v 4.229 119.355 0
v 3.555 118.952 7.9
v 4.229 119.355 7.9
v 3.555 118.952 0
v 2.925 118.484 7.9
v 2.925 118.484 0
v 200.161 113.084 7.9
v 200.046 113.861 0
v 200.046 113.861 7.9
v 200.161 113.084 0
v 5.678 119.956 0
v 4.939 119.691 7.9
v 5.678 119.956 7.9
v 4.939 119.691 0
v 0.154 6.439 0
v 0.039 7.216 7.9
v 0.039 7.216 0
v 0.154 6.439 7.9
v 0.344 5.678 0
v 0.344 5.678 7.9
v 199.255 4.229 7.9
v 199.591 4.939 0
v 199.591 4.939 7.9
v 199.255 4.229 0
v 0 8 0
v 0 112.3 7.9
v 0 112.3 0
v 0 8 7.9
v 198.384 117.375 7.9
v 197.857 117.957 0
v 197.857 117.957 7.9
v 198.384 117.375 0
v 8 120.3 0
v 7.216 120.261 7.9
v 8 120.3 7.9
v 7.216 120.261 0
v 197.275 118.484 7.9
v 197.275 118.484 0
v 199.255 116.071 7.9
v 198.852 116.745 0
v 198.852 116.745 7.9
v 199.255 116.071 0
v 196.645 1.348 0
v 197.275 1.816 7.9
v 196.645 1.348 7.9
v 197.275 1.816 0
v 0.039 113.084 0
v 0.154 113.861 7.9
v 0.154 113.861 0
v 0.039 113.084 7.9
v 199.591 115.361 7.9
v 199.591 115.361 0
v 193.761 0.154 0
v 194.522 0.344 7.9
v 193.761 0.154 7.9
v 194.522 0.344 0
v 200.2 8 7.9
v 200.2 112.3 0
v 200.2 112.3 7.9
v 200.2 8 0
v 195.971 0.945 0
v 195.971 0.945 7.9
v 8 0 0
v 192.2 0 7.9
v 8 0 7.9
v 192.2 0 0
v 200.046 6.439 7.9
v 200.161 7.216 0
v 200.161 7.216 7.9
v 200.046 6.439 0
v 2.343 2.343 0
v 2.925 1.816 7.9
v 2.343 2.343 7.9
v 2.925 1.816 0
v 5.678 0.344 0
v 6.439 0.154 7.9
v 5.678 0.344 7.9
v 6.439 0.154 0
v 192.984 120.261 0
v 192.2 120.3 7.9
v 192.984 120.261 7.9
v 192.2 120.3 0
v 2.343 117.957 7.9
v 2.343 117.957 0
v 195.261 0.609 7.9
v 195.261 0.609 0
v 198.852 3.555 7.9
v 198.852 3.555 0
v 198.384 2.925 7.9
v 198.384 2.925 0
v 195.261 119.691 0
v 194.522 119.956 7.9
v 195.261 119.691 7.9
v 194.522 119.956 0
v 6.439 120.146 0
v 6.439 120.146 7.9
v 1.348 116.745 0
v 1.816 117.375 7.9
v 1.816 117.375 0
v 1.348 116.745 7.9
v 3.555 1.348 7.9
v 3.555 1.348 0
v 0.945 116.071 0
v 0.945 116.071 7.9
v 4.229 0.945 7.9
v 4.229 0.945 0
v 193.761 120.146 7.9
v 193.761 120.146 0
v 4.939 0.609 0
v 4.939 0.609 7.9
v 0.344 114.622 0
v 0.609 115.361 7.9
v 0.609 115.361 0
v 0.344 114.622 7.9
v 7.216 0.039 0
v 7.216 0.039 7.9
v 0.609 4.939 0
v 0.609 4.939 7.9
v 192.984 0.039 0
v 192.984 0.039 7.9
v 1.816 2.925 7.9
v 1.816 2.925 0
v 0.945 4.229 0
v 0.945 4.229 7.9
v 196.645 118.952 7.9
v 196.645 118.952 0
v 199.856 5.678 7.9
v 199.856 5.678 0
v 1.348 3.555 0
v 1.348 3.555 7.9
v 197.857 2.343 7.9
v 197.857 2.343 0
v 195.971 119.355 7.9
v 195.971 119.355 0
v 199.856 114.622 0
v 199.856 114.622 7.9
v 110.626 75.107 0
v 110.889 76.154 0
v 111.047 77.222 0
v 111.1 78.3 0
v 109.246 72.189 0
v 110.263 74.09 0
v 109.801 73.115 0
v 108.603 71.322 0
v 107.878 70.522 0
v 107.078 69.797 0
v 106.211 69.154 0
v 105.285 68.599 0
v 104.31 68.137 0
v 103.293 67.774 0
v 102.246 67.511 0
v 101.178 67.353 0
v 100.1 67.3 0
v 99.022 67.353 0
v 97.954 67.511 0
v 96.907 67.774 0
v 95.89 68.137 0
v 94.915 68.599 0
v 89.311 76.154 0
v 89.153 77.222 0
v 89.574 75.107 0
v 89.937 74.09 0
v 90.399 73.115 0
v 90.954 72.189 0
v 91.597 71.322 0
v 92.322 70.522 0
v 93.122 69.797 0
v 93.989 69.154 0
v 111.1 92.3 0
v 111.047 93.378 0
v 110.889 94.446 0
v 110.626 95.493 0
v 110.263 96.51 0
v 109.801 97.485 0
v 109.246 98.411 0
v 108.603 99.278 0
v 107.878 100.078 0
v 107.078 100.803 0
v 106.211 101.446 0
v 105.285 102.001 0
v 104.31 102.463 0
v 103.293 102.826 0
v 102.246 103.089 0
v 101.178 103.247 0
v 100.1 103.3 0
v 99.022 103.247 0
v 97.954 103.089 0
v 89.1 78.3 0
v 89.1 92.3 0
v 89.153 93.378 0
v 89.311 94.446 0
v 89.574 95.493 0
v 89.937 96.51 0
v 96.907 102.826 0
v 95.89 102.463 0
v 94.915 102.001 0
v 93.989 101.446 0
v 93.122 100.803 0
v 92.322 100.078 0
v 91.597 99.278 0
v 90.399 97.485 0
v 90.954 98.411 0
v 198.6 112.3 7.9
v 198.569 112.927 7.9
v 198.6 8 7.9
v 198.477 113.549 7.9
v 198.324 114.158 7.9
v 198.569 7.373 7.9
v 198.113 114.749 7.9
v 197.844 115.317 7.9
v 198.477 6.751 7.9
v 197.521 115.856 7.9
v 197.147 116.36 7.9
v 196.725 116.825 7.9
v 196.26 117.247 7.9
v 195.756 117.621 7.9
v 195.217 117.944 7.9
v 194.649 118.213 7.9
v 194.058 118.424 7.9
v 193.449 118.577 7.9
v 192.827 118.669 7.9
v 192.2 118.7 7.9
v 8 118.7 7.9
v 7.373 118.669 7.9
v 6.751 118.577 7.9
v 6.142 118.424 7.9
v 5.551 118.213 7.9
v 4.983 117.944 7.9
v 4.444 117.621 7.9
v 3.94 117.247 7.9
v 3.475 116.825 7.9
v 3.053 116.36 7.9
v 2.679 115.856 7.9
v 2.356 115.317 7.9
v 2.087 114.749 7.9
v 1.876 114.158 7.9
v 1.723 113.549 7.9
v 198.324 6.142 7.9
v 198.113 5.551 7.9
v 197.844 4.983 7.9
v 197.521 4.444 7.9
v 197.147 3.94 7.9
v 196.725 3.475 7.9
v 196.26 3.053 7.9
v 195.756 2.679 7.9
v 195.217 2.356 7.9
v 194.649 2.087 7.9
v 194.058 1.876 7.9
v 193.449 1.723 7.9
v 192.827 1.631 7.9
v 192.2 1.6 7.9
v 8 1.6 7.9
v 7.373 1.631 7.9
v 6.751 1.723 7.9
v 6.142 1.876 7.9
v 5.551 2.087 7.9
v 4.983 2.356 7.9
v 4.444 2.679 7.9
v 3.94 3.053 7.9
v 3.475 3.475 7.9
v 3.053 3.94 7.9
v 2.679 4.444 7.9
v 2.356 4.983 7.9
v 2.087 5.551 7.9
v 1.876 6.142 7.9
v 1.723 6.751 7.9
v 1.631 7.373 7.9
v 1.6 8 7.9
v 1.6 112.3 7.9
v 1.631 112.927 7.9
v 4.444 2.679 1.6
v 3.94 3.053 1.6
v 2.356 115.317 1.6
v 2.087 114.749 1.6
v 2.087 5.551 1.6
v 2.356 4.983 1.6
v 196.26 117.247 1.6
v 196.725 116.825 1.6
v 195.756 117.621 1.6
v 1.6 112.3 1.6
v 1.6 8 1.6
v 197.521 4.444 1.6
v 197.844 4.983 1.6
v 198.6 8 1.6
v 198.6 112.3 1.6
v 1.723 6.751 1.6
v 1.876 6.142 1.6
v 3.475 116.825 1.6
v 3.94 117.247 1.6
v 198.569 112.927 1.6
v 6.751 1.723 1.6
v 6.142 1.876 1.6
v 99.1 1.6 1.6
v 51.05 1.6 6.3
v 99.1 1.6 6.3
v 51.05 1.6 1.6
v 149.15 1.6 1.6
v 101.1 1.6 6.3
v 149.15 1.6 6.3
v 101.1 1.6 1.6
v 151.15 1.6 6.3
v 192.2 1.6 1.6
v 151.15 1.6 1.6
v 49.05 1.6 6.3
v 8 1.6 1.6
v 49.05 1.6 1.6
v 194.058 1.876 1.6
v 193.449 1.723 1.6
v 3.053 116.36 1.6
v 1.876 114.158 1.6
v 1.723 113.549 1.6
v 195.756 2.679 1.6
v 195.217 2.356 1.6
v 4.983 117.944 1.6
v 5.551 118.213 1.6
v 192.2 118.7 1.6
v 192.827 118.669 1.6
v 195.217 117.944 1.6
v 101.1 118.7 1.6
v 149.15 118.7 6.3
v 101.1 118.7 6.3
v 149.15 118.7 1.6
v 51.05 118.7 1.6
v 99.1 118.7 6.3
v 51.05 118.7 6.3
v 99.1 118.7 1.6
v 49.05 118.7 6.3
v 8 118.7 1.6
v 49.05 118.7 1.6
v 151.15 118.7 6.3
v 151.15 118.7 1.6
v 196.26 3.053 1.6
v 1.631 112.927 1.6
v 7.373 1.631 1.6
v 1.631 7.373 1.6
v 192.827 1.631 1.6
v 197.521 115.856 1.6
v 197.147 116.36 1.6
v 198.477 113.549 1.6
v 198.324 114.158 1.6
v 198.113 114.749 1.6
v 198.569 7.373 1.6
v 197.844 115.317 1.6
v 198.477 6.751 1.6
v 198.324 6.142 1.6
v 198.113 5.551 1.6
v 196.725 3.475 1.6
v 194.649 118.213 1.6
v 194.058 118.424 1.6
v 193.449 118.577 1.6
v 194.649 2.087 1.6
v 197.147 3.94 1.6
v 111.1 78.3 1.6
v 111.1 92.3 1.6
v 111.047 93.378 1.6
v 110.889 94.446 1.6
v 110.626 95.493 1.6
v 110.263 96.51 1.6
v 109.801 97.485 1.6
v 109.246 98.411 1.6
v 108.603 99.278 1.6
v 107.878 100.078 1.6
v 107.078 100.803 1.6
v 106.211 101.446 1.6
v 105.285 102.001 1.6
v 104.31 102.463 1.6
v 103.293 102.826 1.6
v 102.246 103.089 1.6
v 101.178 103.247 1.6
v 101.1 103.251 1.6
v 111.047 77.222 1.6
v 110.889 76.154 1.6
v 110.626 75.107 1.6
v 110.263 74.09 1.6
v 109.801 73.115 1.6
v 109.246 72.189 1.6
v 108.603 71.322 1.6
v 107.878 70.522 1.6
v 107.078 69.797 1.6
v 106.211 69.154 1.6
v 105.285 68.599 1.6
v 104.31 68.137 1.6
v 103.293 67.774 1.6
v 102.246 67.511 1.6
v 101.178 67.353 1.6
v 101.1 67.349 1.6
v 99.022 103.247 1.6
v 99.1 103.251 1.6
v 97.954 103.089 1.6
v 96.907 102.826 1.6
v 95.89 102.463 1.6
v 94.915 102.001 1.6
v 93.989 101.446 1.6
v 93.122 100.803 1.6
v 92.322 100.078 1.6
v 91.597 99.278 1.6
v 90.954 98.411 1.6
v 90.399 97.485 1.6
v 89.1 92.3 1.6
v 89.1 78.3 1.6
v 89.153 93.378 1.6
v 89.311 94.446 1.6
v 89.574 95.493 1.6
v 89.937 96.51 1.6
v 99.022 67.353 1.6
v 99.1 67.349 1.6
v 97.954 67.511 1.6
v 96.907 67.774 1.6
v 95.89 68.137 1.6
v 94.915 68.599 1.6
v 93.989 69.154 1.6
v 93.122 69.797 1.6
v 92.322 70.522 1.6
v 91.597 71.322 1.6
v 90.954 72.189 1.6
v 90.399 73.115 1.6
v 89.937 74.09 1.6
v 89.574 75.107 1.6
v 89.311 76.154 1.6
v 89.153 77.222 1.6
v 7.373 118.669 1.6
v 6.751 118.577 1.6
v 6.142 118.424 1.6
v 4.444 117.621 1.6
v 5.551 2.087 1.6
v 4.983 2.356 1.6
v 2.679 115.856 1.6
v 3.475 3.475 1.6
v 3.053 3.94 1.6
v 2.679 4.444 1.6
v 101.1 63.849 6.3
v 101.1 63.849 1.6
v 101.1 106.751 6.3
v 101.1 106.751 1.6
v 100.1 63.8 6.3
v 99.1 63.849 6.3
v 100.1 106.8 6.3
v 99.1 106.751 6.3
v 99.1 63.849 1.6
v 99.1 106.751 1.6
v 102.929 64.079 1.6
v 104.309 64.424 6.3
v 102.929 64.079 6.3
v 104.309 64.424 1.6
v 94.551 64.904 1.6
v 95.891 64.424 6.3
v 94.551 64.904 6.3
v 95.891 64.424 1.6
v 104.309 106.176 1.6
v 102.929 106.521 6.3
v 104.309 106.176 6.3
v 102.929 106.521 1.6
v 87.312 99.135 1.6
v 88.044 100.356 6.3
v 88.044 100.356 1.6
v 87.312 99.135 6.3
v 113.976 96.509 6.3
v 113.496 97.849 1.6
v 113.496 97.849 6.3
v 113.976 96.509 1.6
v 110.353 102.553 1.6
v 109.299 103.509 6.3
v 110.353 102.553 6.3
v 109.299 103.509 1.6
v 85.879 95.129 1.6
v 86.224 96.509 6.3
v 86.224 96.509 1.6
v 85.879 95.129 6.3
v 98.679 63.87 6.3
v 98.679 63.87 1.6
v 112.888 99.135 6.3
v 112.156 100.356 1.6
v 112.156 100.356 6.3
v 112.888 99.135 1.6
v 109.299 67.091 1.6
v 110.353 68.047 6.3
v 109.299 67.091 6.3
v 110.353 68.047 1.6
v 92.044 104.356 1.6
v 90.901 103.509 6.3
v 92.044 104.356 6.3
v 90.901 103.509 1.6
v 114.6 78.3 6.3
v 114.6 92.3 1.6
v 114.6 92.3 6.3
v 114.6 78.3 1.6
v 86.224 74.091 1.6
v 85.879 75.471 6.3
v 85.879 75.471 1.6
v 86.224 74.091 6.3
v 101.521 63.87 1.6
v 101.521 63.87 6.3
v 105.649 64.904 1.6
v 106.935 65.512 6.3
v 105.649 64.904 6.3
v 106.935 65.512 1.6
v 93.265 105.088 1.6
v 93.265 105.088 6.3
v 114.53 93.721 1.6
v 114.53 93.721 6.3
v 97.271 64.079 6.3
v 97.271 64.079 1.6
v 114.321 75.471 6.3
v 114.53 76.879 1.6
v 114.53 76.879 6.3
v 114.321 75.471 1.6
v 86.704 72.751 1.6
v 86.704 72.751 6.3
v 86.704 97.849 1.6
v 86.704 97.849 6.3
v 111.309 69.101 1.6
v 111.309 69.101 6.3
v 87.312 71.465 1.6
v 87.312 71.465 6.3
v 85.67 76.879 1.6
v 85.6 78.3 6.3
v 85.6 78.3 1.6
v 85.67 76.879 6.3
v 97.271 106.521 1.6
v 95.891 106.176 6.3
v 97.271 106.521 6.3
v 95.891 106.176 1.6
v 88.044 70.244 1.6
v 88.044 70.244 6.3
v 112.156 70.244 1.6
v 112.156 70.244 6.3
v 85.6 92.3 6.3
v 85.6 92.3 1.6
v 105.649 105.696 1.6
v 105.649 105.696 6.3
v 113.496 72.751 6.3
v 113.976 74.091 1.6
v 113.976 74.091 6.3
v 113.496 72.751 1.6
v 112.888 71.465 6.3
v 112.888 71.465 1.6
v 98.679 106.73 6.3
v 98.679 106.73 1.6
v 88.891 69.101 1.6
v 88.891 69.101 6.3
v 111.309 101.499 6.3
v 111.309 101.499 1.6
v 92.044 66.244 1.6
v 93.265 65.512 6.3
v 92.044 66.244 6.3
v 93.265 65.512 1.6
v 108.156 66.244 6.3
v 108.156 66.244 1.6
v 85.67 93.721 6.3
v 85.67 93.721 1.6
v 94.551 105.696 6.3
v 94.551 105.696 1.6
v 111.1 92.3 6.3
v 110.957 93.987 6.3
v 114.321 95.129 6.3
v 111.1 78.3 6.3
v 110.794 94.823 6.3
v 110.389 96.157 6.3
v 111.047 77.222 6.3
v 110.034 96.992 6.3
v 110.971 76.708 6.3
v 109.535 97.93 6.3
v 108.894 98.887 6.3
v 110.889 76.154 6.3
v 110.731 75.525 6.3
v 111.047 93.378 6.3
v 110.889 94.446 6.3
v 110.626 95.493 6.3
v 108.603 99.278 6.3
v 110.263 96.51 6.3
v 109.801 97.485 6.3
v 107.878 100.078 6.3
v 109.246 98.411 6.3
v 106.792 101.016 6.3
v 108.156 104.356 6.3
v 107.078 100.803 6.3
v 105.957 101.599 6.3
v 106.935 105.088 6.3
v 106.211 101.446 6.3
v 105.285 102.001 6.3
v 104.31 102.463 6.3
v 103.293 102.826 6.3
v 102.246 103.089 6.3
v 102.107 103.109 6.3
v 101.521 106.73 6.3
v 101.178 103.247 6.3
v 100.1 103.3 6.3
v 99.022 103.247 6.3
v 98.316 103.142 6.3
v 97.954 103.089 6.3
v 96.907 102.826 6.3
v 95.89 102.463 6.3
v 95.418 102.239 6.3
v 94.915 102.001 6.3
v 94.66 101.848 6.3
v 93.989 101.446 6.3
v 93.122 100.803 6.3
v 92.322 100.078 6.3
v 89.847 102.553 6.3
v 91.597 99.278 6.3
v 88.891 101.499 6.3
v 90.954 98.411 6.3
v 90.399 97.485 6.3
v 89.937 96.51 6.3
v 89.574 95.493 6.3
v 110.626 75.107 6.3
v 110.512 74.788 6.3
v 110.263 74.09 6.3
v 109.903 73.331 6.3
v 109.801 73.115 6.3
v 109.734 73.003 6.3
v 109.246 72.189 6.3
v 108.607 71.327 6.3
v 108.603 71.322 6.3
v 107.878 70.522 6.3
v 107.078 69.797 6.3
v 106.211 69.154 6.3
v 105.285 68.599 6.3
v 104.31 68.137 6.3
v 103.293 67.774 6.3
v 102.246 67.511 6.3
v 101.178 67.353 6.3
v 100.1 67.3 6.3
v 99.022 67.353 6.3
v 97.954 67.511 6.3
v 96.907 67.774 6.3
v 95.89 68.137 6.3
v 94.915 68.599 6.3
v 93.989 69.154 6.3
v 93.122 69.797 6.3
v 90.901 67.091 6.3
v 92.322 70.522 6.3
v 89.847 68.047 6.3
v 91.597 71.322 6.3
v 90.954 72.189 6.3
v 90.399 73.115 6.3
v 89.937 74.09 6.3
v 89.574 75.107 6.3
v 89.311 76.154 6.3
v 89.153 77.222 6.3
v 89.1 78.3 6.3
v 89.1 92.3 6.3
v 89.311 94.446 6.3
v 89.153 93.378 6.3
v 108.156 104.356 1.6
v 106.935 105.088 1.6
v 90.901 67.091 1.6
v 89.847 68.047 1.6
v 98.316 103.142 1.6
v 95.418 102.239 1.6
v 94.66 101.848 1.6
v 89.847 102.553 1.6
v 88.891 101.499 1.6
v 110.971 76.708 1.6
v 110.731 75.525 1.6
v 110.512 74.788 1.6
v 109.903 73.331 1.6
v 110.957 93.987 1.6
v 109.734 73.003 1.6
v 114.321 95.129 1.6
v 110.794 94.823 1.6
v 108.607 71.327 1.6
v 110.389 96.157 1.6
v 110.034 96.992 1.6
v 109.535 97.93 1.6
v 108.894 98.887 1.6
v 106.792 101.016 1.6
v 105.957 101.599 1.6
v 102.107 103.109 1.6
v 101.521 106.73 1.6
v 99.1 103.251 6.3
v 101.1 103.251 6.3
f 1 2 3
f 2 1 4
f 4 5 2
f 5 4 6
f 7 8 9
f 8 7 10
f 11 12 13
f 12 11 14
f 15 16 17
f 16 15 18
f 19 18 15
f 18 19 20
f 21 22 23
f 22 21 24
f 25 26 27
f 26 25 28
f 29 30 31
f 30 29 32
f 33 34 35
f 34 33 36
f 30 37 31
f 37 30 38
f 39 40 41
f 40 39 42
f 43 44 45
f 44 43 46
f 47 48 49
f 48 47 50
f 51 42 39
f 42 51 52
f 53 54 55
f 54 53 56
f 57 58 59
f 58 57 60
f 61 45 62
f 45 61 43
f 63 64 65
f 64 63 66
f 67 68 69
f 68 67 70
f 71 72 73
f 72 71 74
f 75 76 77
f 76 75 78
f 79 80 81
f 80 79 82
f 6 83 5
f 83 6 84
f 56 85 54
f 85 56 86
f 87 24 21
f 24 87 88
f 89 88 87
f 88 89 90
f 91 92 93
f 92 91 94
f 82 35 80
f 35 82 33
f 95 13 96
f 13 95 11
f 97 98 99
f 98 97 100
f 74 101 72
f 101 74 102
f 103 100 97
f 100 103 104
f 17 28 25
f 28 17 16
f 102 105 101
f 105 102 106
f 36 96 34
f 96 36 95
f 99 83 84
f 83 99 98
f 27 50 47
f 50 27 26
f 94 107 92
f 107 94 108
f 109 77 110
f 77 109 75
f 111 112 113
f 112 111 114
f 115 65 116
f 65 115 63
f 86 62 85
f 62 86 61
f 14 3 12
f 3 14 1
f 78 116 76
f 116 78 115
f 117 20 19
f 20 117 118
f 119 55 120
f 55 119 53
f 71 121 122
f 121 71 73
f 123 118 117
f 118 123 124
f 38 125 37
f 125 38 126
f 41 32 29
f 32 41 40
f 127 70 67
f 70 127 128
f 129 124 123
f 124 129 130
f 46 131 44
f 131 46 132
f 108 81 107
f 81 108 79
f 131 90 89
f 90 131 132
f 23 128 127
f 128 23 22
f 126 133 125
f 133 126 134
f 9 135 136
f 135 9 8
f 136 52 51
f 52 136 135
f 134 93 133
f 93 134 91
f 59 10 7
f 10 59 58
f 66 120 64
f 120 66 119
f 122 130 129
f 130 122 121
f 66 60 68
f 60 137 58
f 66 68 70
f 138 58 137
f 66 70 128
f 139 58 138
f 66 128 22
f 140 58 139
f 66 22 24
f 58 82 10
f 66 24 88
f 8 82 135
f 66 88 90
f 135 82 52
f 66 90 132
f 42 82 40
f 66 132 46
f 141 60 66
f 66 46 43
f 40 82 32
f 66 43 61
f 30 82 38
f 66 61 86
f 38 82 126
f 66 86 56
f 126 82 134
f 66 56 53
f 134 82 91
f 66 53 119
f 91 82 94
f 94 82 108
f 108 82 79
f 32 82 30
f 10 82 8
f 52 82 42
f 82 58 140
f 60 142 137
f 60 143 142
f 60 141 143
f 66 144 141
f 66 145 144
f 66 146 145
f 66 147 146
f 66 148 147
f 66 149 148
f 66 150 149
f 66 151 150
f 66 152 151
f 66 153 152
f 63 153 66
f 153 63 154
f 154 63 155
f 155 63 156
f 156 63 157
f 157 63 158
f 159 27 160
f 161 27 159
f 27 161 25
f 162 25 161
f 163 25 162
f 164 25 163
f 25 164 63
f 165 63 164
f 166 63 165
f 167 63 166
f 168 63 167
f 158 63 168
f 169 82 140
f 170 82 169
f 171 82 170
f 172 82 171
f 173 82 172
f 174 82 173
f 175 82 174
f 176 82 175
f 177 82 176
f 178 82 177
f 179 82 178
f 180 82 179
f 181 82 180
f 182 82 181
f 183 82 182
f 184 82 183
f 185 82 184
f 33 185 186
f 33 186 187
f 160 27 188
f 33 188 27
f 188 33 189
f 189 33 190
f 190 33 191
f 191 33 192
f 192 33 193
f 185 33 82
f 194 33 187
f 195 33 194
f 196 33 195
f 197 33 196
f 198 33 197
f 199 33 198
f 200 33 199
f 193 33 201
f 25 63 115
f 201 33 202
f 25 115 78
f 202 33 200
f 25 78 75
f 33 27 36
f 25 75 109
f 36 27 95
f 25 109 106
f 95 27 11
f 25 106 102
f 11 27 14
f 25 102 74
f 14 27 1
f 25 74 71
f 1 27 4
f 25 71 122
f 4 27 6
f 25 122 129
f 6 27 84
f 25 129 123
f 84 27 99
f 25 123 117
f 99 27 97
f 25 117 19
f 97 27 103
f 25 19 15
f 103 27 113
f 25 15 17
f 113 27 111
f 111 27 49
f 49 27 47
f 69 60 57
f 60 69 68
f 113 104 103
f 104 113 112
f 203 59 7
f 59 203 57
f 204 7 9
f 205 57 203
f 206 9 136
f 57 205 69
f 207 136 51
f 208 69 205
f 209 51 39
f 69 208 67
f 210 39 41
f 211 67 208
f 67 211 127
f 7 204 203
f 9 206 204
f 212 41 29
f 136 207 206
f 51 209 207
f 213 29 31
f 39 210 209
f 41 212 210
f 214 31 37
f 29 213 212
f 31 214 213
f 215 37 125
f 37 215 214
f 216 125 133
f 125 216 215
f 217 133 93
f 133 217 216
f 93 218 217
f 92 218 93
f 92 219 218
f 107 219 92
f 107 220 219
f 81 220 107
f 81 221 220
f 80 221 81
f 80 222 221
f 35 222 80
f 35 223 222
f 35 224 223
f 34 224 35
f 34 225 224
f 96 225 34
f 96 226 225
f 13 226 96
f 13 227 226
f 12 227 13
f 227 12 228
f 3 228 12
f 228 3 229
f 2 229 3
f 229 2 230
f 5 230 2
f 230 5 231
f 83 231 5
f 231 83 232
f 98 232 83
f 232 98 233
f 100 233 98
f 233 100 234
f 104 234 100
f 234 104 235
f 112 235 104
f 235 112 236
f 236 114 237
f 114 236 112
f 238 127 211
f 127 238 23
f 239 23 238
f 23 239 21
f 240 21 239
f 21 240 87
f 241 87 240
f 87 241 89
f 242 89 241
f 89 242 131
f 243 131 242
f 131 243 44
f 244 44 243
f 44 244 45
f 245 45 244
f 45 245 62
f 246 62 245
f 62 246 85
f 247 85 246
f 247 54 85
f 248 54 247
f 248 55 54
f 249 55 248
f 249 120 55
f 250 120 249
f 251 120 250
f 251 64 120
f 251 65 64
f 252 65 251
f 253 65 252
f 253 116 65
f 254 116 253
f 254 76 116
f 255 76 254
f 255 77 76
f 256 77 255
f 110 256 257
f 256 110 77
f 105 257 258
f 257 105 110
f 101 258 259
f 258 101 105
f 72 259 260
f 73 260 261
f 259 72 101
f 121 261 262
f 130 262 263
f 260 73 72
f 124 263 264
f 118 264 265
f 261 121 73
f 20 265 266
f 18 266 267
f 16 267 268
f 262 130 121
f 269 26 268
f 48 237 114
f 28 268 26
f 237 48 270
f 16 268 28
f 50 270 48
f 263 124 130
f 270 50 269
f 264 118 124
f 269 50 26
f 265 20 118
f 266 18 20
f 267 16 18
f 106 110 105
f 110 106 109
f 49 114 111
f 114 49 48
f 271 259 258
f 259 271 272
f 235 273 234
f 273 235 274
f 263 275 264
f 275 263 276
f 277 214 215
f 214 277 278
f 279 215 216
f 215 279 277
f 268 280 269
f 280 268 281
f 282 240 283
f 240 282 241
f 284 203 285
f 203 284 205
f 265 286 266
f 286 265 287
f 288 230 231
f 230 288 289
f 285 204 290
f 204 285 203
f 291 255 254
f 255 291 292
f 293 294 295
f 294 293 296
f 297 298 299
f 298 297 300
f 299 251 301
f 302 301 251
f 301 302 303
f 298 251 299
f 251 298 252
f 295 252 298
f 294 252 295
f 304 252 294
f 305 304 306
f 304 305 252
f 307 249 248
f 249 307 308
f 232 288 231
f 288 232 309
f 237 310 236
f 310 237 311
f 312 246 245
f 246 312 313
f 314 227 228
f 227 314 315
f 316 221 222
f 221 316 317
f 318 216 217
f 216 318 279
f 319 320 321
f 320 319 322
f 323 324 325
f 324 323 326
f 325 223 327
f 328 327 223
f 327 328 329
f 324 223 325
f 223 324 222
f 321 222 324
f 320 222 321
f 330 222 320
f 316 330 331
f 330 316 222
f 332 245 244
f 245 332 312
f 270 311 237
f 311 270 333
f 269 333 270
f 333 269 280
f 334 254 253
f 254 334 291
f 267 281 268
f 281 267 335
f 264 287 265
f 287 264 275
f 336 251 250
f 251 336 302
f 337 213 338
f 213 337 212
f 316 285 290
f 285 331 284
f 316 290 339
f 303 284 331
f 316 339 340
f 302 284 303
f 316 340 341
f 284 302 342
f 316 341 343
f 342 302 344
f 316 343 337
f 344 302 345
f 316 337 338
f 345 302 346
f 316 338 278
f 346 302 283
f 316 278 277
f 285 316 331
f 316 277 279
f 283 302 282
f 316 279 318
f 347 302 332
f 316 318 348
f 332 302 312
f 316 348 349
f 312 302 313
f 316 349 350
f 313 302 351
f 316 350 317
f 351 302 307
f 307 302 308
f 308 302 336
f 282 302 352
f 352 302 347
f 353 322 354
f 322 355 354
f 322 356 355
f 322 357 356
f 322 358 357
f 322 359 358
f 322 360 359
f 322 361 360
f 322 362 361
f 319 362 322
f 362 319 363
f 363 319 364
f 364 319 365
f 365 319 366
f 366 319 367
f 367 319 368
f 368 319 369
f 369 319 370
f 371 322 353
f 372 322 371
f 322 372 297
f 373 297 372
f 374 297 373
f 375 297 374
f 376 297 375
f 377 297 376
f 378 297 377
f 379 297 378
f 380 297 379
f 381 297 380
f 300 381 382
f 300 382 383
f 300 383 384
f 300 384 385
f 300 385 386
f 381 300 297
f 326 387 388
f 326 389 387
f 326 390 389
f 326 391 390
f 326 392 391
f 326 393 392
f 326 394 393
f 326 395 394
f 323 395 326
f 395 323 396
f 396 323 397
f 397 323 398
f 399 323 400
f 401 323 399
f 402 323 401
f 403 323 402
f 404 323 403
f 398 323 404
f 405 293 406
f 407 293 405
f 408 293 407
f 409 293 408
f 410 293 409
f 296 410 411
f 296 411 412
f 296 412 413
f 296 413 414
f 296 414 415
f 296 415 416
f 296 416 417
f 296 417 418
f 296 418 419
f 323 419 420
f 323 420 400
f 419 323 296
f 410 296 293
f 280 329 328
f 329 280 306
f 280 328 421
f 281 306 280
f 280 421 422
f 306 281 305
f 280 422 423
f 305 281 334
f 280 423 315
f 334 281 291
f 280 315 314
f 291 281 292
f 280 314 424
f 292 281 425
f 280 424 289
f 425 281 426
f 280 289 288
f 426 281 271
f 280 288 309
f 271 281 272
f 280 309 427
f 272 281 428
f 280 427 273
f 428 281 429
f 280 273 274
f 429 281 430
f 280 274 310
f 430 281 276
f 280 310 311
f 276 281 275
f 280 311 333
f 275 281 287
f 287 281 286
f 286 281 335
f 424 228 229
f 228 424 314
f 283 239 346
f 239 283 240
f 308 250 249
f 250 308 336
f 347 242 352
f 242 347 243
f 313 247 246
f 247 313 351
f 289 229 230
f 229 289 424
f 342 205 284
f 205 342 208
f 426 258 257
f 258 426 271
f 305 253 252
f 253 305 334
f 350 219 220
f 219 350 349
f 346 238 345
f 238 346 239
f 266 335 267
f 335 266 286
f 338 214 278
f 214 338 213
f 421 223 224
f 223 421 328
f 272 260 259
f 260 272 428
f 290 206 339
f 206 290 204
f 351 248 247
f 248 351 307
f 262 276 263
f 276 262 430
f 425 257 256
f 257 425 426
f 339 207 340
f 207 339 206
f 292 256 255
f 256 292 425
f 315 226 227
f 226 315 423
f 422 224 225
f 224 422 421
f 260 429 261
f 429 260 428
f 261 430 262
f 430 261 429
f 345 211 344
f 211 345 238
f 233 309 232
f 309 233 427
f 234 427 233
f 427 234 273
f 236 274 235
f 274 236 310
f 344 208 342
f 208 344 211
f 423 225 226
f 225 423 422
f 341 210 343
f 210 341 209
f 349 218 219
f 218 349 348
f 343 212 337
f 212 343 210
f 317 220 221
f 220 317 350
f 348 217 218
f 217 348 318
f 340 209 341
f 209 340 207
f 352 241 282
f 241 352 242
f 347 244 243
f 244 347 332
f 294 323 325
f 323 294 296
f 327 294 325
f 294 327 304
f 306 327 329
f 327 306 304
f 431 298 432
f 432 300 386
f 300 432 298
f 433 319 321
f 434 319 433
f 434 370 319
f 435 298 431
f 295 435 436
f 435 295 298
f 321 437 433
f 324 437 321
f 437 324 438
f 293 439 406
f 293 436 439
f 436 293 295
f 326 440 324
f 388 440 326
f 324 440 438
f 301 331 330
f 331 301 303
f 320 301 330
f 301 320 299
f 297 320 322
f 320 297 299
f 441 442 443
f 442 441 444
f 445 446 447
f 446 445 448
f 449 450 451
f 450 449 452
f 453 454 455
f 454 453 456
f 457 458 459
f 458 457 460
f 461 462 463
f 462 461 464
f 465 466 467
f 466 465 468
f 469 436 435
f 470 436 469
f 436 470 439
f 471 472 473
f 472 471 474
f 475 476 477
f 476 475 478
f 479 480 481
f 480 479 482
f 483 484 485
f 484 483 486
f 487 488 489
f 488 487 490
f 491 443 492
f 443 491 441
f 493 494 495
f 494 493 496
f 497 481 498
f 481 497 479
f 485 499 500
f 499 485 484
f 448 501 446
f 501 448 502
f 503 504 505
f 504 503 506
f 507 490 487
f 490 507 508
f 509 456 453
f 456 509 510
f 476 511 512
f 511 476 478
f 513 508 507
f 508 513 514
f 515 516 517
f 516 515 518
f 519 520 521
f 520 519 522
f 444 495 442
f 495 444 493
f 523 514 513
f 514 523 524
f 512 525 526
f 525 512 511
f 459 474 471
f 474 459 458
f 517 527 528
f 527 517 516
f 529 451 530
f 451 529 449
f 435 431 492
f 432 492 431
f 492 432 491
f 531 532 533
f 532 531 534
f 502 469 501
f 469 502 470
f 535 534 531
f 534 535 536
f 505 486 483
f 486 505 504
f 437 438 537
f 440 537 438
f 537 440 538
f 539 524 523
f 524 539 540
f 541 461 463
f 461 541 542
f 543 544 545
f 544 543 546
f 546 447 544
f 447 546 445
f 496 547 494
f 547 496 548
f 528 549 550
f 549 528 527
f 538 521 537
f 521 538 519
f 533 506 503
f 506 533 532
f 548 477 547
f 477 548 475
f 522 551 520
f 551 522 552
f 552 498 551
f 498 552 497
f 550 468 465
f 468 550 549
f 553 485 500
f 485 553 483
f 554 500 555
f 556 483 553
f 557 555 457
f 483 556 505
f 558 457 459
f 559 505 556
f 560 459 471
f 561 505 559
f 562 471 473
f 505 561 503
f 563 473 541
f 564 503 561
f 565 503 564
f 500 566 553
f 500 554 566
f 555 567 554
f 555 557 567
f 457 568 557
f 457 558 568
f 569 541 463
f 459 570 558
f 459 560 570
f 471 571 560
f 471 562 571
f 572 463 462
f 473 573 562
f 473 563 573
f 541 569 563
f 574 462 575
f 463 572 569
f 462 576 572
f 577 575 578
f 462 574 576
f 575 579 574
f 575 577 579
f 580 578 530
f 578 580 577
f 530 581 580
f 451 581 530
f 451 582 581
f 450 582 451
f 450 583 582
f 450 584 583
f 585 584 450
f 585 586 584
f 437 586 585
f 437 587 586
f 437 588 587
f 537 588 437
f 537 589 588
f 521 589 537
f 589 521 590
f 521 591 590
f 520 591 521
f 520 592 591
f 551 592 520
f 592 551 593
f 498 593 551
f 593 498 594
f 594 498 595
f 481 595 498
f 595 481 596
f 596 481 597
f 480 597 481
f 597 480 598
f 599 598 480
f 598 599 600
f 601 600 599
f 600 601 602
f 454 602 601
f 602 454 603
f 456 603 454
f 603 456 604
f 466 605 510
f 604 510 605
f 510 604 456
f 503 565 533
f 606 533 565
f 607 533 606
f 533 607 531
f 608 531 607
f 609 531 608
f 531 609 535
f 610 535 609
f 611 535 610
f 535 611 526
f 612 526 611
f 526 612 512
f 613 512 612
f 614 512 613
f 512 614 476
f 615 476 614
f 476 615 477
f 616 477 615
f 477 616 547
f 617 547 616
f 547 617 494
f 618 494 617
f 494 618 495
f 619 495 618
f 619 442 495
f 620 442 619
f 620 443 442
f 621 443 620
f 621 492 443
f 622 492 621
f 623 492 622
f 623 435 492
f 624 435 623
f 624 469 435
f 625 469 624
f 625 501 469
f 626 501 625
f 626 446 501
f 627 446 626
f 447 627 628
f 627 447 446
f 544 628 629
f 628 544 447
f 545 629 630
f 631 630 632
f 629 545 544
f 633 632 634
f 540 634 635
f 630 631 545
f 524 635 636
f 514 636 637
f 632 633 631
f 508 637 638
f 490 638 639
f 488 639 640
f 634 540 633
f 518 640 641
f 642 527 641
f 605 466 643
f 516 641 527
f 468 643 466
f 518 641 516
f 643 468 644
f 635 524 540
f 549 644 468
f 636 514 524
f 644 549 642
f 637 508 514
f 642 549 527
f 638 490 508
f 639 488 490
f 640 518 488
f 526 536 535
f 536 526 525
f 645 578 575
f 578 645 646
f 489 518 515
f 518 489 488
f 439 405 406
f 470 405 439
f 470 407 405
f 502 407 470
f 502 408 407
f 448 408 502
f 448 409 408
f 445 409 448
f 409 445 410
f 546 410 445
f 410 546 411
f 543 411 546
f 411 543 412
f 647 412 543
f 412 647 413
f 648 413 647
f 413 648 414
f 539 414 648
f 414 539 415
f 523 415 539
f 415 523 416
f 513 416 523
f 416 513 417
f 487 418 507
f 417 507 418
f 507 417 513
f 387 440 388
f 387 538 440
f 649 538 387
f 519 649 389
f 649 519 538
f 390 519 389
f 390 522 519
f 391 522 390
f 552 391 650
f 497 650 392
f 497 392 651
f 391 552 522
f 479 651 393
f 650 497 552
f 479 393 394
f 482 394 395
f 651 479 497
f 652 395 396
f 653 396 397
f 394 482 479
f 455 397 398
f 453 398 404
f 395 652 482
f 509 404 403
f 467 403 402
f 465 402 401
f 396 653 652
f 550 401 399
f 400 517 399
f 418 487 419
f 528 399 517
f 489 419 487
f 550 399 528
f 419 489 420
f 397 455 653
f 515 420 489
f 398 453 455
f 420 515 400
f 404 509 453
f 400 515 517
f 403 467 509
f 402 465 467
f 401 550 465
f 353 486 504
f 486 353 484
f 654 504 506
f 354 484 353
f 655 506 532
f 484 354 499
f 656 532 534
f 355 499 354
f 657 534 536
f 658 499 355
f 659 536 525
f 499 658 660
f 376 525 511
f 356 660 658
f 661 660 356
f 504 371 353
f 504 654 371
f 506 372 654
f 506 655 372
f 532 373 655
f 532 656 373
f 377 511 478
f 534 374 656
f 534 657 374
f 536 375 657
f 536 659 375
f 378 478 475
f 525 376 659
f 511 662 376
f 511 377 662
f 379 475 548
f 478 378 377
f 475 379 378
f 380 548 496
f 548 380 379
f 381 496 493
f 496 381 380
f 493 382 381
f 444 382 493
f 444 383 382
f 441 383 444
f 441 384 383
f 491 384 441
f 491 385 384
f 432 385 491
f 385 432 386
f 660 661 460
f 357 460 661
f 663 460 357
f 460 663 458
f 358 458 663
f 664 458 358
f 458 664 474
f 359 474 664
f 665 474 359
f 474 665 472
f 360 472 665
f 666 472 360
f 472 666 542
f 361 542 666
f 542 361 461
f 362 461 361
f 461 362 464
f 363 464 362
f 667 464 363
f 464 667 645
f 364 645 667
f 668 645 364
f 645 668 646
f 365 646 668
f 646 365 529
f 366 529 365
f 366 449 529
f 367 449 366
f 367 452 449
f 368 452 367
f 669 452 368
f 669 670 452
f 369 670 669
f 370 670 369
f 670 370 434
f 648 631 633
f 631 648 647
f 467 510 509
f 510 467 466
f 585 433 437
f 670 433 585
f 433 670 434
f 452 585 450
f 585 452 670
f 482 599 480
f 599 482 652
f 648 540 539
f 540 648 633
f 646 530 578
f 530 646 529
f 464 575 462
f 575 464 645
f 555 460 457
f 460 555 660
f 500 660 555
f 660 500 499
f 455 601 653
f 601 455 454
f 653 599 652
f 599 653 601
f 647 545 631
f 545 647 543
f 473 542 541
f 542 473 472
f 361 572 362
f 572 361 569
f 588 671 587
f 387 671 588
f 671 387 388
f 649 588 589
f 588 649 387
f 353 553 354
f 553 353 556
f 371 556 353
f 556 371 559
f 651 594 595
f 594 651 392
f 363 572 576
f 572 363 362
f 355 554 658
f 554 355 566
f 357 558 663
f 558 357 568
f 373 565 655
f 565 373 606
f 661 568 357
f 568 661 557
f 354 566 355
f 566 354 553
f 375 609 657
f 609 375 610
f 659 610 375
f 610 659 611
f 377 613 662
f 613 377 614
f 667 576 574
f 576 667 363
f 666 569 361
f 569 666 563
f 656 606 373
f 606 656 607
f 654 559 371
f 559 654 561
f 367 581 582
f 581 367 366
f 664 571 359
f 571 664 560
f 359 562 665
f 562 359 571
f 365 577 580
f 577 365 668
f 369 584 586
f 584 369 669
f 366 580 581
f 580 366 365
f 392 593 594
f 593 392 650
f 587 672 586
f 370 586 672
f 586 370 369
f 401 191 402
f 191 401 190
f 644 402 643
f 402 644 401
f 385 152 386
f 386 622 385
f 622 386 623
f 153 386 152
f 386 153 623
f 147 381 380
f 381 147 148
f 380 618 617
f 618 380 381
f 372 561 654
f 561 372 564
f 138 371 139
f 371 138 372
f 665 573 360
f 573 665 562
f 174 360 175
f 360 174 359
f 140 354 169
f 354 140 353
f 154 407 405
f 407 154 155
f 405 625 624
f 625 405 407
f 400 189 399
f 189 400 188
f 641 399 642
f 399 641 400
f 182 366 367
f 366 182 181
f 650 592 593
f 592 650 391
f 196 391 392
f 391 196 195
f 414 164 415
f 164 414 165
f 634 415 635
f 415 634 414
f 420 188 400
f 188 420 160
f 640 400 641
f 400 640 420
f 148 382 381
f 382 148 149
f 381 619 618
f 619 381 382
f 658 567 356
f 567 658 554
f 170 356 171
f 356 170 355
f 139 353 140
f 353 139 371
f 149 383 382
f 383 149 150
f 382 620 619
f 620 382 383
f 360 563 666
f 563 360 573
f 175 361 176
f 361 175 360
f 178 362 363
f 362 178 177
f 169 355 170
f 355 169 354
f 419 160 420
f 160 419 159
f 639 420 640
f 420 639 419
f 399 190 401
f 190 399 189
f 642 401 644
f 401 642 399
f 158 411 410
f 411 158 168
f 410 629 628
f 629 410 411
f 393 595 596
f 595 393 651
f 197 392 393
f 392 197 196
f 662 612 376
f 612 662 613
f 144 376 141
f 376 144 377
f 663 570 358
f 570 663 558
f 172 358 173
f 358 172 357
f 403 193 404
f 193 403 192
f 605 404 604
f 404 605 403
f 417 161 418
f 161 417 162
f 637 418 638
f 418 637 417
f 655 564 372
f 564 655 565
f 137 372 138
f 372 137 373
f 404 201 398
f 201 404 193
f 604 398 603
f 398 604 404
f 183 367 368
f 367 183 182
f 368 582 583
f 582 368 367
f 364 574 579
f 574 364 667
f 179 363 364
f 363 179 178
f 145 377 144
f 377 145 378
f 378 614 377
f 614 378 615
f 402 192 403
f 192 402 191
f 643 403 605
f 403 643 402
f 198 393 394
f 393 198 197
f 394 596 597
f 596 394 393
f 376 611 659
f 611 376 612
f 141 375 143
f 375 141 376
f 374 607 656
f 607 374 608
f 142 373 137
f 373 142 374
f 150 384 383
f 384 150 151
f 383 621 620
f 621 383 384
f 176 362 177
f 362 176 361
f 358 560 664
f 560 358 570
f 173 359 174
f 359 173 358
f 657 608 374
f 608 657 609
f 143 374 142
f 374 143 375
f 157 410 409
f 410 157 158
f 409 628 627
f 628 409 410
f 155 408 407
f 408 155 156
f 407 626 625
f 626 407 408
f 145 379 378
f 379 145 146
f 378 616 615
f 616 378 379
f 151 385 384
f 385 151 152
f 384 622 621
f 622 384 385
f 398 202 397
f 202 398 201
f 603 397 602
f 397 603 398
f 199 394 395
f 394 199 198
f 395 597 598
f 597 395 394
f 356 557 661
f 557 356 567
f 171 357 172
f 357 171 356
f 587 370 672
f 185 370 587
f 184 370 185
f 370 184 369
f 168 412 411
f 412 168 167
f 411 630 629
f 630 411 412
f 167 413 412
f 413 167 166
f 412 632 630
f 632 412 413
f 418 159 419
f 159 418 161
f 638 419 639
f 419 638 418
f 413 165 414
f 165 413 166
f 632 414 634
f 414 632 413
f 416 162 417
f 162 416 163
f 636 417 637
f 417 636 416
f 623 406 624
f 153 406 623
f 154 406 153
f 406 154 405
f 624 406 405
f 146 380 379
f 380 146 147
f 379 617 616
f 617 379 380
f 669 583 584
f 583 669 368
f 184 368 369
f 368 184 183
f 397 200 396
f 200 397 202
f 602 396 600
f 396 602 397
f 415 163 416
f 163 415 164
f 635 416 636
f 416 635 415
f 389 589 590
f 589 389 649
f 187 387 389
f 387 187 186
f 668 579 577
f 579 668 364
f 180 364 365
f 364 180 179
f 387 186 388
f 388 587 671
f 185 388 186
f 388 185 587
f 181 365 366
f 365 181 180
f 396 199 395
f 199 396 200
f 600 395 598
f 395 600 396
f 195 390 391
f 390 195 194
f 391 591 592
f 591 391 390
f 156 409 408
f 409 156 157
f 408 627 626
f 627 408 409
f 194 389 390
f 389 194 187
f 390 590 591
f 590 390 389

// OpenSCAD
// =============================================================
// 平板假体（dummy tablet）—— 用于【打印前试装】
//   按小米平板4 8" 实测尺寸做替身，验证：
//     1. 托盘内腔尺寸是否合适（取放松紧）
//     2. 倾角/安装位置/视角（比划着看）
//     3. 收纳挂槽好不好挂
//
//   ⚠ 不是真机能替代品：只验证【几何】，不验证重量手感
//     若要模拟重量，可把 hollow=false + 高填充，或内部塞配重
//
// 用法：改 PARAMS → F6 → Export STL
// =============================================================

// ---------- 输出选择 ----------
PART     = "tablet";   // "tablet" 平板假体 | "gauge" 厚度卡规

// ---------- 平板尺寸（改这里适配你的机器）----------
tab_w   = 200.2;   // 宽
tab_h   = 120.3;   // 高
tab_t   = 7.9;     // 厚

// ---------- 形式 ----------
hollow   = true;   // true 薄壳空心（省料）| false 实心砖（模拟重量）
shell_t  = 1.6;    // 空心时壳厚
rib_n    = 3;      // 内部加强筋数量（空心时）

// ---------- 便利特征 ----------
finger_hole  = true;   // 背面指孔（方便取放测试）
fh_d         = 22;     // 指孔直径
corner_r     = 8;      // 四角圆角（模仿真机手感）

$fn = 64;

// ---------- 主体 ----------
module body() {
    if (hollow) {
        difference() {
            // 外形
            round_box(tab_w, tab_h, tab_t, corner_r);
            // 掏空（留壳厚）
            translate([shell_t, shell_t, shell_t])
                round_box(tab_w - shell_t*2, tab_h - shell_t*2,
                          tab_t, corner_r - shell_t);
        }
        // 内部加强筋
        for (i = [0 : rib_n-1]) {
            x = tab_w*(i+1)/(rib_n+1);
            translate([x - 1, shell_t, shell_t])
                cube([2, tab_h - shell_t*2, tab_t - shell_t*2]);
        }
    } else {
        round_box(tab_w, tab_h, tab_t, corner_r);
    }
}

// 圆角方块
module round_box(w, h, t, r) {
    hull() {
        for (dx = [-1, 1]) for (dy = [-1, 1])
            translate([w/2 + dx*(w/2 - r), h/2 + dy*(h/2 - r), 0])
                cylinder(r = r, h = t);
    }
}

// ---------- 背面指孔（取放用）----------
// ⚠ 必须是【减料】：用 difference 从本体挖穿
//    早期写成 union 会变成一个凸台（还让总厚变成 9.9）
module finger() {
    // 一个长圆孔，靠近上边中部——方便拇指顶出平板
    translate([tab_w/2, tab_h - 28, -1])
        hull() {
            cylinder(d = fh_d, h = tab_t + 2);
            translate([0, -14, 0]) cylinder(d = fh_d, h = tab_t + 2);
        }
}

// 指孔周围的加强环（空心件孔边只有 1.6mm，反复取放会裂）
module finger_rib() {
    if (hollow) {
        translate([tab_w/2, tab_h - 28, shell_t])
            difference() {
                hull() {
                    cylinder(d = fh_d + 7, h = tab_t - shell_t*2);
                    translate([0, -14, 0]) cylinder(d = fh_d + 7, h = tab_t - shell_t*2);
                }
                hull() {
                    cylinder(d = fh_d, h = tab_t);
                    translate([0, -14, 0]) cylinder(d = fh_d, h = tab_t);
                }
            }
    }
}

// ---------- 配件：厚度卡规（验内腔松紧）----------
// 打 3 个不同厚度的薄片，插进托盘试松紧：7.9 / 8.4 / 8.9
module gauge_stack() {
    gap = 4;
    for (i = [0:2]) {
        th = tab_t + i*0.5;
        translate([i*(40+gap), 0, 0]) {
            difference() {
                cube([40, 30, th]);
                translate([6, 6, -1]) cube([28, 18, th+2]);  // 掏成框
            }
        }
    }
}

// ---------- 输出 ----------
module final() {
    difference() {
        union() {
            body();
            if (finger_hole) finger_rib();   // 先加加强环
        }
        if (finger_hole) finger();           // 再挖穿指孔
    }
}

if (PART == "gauge") gauge_stack(); else final();
